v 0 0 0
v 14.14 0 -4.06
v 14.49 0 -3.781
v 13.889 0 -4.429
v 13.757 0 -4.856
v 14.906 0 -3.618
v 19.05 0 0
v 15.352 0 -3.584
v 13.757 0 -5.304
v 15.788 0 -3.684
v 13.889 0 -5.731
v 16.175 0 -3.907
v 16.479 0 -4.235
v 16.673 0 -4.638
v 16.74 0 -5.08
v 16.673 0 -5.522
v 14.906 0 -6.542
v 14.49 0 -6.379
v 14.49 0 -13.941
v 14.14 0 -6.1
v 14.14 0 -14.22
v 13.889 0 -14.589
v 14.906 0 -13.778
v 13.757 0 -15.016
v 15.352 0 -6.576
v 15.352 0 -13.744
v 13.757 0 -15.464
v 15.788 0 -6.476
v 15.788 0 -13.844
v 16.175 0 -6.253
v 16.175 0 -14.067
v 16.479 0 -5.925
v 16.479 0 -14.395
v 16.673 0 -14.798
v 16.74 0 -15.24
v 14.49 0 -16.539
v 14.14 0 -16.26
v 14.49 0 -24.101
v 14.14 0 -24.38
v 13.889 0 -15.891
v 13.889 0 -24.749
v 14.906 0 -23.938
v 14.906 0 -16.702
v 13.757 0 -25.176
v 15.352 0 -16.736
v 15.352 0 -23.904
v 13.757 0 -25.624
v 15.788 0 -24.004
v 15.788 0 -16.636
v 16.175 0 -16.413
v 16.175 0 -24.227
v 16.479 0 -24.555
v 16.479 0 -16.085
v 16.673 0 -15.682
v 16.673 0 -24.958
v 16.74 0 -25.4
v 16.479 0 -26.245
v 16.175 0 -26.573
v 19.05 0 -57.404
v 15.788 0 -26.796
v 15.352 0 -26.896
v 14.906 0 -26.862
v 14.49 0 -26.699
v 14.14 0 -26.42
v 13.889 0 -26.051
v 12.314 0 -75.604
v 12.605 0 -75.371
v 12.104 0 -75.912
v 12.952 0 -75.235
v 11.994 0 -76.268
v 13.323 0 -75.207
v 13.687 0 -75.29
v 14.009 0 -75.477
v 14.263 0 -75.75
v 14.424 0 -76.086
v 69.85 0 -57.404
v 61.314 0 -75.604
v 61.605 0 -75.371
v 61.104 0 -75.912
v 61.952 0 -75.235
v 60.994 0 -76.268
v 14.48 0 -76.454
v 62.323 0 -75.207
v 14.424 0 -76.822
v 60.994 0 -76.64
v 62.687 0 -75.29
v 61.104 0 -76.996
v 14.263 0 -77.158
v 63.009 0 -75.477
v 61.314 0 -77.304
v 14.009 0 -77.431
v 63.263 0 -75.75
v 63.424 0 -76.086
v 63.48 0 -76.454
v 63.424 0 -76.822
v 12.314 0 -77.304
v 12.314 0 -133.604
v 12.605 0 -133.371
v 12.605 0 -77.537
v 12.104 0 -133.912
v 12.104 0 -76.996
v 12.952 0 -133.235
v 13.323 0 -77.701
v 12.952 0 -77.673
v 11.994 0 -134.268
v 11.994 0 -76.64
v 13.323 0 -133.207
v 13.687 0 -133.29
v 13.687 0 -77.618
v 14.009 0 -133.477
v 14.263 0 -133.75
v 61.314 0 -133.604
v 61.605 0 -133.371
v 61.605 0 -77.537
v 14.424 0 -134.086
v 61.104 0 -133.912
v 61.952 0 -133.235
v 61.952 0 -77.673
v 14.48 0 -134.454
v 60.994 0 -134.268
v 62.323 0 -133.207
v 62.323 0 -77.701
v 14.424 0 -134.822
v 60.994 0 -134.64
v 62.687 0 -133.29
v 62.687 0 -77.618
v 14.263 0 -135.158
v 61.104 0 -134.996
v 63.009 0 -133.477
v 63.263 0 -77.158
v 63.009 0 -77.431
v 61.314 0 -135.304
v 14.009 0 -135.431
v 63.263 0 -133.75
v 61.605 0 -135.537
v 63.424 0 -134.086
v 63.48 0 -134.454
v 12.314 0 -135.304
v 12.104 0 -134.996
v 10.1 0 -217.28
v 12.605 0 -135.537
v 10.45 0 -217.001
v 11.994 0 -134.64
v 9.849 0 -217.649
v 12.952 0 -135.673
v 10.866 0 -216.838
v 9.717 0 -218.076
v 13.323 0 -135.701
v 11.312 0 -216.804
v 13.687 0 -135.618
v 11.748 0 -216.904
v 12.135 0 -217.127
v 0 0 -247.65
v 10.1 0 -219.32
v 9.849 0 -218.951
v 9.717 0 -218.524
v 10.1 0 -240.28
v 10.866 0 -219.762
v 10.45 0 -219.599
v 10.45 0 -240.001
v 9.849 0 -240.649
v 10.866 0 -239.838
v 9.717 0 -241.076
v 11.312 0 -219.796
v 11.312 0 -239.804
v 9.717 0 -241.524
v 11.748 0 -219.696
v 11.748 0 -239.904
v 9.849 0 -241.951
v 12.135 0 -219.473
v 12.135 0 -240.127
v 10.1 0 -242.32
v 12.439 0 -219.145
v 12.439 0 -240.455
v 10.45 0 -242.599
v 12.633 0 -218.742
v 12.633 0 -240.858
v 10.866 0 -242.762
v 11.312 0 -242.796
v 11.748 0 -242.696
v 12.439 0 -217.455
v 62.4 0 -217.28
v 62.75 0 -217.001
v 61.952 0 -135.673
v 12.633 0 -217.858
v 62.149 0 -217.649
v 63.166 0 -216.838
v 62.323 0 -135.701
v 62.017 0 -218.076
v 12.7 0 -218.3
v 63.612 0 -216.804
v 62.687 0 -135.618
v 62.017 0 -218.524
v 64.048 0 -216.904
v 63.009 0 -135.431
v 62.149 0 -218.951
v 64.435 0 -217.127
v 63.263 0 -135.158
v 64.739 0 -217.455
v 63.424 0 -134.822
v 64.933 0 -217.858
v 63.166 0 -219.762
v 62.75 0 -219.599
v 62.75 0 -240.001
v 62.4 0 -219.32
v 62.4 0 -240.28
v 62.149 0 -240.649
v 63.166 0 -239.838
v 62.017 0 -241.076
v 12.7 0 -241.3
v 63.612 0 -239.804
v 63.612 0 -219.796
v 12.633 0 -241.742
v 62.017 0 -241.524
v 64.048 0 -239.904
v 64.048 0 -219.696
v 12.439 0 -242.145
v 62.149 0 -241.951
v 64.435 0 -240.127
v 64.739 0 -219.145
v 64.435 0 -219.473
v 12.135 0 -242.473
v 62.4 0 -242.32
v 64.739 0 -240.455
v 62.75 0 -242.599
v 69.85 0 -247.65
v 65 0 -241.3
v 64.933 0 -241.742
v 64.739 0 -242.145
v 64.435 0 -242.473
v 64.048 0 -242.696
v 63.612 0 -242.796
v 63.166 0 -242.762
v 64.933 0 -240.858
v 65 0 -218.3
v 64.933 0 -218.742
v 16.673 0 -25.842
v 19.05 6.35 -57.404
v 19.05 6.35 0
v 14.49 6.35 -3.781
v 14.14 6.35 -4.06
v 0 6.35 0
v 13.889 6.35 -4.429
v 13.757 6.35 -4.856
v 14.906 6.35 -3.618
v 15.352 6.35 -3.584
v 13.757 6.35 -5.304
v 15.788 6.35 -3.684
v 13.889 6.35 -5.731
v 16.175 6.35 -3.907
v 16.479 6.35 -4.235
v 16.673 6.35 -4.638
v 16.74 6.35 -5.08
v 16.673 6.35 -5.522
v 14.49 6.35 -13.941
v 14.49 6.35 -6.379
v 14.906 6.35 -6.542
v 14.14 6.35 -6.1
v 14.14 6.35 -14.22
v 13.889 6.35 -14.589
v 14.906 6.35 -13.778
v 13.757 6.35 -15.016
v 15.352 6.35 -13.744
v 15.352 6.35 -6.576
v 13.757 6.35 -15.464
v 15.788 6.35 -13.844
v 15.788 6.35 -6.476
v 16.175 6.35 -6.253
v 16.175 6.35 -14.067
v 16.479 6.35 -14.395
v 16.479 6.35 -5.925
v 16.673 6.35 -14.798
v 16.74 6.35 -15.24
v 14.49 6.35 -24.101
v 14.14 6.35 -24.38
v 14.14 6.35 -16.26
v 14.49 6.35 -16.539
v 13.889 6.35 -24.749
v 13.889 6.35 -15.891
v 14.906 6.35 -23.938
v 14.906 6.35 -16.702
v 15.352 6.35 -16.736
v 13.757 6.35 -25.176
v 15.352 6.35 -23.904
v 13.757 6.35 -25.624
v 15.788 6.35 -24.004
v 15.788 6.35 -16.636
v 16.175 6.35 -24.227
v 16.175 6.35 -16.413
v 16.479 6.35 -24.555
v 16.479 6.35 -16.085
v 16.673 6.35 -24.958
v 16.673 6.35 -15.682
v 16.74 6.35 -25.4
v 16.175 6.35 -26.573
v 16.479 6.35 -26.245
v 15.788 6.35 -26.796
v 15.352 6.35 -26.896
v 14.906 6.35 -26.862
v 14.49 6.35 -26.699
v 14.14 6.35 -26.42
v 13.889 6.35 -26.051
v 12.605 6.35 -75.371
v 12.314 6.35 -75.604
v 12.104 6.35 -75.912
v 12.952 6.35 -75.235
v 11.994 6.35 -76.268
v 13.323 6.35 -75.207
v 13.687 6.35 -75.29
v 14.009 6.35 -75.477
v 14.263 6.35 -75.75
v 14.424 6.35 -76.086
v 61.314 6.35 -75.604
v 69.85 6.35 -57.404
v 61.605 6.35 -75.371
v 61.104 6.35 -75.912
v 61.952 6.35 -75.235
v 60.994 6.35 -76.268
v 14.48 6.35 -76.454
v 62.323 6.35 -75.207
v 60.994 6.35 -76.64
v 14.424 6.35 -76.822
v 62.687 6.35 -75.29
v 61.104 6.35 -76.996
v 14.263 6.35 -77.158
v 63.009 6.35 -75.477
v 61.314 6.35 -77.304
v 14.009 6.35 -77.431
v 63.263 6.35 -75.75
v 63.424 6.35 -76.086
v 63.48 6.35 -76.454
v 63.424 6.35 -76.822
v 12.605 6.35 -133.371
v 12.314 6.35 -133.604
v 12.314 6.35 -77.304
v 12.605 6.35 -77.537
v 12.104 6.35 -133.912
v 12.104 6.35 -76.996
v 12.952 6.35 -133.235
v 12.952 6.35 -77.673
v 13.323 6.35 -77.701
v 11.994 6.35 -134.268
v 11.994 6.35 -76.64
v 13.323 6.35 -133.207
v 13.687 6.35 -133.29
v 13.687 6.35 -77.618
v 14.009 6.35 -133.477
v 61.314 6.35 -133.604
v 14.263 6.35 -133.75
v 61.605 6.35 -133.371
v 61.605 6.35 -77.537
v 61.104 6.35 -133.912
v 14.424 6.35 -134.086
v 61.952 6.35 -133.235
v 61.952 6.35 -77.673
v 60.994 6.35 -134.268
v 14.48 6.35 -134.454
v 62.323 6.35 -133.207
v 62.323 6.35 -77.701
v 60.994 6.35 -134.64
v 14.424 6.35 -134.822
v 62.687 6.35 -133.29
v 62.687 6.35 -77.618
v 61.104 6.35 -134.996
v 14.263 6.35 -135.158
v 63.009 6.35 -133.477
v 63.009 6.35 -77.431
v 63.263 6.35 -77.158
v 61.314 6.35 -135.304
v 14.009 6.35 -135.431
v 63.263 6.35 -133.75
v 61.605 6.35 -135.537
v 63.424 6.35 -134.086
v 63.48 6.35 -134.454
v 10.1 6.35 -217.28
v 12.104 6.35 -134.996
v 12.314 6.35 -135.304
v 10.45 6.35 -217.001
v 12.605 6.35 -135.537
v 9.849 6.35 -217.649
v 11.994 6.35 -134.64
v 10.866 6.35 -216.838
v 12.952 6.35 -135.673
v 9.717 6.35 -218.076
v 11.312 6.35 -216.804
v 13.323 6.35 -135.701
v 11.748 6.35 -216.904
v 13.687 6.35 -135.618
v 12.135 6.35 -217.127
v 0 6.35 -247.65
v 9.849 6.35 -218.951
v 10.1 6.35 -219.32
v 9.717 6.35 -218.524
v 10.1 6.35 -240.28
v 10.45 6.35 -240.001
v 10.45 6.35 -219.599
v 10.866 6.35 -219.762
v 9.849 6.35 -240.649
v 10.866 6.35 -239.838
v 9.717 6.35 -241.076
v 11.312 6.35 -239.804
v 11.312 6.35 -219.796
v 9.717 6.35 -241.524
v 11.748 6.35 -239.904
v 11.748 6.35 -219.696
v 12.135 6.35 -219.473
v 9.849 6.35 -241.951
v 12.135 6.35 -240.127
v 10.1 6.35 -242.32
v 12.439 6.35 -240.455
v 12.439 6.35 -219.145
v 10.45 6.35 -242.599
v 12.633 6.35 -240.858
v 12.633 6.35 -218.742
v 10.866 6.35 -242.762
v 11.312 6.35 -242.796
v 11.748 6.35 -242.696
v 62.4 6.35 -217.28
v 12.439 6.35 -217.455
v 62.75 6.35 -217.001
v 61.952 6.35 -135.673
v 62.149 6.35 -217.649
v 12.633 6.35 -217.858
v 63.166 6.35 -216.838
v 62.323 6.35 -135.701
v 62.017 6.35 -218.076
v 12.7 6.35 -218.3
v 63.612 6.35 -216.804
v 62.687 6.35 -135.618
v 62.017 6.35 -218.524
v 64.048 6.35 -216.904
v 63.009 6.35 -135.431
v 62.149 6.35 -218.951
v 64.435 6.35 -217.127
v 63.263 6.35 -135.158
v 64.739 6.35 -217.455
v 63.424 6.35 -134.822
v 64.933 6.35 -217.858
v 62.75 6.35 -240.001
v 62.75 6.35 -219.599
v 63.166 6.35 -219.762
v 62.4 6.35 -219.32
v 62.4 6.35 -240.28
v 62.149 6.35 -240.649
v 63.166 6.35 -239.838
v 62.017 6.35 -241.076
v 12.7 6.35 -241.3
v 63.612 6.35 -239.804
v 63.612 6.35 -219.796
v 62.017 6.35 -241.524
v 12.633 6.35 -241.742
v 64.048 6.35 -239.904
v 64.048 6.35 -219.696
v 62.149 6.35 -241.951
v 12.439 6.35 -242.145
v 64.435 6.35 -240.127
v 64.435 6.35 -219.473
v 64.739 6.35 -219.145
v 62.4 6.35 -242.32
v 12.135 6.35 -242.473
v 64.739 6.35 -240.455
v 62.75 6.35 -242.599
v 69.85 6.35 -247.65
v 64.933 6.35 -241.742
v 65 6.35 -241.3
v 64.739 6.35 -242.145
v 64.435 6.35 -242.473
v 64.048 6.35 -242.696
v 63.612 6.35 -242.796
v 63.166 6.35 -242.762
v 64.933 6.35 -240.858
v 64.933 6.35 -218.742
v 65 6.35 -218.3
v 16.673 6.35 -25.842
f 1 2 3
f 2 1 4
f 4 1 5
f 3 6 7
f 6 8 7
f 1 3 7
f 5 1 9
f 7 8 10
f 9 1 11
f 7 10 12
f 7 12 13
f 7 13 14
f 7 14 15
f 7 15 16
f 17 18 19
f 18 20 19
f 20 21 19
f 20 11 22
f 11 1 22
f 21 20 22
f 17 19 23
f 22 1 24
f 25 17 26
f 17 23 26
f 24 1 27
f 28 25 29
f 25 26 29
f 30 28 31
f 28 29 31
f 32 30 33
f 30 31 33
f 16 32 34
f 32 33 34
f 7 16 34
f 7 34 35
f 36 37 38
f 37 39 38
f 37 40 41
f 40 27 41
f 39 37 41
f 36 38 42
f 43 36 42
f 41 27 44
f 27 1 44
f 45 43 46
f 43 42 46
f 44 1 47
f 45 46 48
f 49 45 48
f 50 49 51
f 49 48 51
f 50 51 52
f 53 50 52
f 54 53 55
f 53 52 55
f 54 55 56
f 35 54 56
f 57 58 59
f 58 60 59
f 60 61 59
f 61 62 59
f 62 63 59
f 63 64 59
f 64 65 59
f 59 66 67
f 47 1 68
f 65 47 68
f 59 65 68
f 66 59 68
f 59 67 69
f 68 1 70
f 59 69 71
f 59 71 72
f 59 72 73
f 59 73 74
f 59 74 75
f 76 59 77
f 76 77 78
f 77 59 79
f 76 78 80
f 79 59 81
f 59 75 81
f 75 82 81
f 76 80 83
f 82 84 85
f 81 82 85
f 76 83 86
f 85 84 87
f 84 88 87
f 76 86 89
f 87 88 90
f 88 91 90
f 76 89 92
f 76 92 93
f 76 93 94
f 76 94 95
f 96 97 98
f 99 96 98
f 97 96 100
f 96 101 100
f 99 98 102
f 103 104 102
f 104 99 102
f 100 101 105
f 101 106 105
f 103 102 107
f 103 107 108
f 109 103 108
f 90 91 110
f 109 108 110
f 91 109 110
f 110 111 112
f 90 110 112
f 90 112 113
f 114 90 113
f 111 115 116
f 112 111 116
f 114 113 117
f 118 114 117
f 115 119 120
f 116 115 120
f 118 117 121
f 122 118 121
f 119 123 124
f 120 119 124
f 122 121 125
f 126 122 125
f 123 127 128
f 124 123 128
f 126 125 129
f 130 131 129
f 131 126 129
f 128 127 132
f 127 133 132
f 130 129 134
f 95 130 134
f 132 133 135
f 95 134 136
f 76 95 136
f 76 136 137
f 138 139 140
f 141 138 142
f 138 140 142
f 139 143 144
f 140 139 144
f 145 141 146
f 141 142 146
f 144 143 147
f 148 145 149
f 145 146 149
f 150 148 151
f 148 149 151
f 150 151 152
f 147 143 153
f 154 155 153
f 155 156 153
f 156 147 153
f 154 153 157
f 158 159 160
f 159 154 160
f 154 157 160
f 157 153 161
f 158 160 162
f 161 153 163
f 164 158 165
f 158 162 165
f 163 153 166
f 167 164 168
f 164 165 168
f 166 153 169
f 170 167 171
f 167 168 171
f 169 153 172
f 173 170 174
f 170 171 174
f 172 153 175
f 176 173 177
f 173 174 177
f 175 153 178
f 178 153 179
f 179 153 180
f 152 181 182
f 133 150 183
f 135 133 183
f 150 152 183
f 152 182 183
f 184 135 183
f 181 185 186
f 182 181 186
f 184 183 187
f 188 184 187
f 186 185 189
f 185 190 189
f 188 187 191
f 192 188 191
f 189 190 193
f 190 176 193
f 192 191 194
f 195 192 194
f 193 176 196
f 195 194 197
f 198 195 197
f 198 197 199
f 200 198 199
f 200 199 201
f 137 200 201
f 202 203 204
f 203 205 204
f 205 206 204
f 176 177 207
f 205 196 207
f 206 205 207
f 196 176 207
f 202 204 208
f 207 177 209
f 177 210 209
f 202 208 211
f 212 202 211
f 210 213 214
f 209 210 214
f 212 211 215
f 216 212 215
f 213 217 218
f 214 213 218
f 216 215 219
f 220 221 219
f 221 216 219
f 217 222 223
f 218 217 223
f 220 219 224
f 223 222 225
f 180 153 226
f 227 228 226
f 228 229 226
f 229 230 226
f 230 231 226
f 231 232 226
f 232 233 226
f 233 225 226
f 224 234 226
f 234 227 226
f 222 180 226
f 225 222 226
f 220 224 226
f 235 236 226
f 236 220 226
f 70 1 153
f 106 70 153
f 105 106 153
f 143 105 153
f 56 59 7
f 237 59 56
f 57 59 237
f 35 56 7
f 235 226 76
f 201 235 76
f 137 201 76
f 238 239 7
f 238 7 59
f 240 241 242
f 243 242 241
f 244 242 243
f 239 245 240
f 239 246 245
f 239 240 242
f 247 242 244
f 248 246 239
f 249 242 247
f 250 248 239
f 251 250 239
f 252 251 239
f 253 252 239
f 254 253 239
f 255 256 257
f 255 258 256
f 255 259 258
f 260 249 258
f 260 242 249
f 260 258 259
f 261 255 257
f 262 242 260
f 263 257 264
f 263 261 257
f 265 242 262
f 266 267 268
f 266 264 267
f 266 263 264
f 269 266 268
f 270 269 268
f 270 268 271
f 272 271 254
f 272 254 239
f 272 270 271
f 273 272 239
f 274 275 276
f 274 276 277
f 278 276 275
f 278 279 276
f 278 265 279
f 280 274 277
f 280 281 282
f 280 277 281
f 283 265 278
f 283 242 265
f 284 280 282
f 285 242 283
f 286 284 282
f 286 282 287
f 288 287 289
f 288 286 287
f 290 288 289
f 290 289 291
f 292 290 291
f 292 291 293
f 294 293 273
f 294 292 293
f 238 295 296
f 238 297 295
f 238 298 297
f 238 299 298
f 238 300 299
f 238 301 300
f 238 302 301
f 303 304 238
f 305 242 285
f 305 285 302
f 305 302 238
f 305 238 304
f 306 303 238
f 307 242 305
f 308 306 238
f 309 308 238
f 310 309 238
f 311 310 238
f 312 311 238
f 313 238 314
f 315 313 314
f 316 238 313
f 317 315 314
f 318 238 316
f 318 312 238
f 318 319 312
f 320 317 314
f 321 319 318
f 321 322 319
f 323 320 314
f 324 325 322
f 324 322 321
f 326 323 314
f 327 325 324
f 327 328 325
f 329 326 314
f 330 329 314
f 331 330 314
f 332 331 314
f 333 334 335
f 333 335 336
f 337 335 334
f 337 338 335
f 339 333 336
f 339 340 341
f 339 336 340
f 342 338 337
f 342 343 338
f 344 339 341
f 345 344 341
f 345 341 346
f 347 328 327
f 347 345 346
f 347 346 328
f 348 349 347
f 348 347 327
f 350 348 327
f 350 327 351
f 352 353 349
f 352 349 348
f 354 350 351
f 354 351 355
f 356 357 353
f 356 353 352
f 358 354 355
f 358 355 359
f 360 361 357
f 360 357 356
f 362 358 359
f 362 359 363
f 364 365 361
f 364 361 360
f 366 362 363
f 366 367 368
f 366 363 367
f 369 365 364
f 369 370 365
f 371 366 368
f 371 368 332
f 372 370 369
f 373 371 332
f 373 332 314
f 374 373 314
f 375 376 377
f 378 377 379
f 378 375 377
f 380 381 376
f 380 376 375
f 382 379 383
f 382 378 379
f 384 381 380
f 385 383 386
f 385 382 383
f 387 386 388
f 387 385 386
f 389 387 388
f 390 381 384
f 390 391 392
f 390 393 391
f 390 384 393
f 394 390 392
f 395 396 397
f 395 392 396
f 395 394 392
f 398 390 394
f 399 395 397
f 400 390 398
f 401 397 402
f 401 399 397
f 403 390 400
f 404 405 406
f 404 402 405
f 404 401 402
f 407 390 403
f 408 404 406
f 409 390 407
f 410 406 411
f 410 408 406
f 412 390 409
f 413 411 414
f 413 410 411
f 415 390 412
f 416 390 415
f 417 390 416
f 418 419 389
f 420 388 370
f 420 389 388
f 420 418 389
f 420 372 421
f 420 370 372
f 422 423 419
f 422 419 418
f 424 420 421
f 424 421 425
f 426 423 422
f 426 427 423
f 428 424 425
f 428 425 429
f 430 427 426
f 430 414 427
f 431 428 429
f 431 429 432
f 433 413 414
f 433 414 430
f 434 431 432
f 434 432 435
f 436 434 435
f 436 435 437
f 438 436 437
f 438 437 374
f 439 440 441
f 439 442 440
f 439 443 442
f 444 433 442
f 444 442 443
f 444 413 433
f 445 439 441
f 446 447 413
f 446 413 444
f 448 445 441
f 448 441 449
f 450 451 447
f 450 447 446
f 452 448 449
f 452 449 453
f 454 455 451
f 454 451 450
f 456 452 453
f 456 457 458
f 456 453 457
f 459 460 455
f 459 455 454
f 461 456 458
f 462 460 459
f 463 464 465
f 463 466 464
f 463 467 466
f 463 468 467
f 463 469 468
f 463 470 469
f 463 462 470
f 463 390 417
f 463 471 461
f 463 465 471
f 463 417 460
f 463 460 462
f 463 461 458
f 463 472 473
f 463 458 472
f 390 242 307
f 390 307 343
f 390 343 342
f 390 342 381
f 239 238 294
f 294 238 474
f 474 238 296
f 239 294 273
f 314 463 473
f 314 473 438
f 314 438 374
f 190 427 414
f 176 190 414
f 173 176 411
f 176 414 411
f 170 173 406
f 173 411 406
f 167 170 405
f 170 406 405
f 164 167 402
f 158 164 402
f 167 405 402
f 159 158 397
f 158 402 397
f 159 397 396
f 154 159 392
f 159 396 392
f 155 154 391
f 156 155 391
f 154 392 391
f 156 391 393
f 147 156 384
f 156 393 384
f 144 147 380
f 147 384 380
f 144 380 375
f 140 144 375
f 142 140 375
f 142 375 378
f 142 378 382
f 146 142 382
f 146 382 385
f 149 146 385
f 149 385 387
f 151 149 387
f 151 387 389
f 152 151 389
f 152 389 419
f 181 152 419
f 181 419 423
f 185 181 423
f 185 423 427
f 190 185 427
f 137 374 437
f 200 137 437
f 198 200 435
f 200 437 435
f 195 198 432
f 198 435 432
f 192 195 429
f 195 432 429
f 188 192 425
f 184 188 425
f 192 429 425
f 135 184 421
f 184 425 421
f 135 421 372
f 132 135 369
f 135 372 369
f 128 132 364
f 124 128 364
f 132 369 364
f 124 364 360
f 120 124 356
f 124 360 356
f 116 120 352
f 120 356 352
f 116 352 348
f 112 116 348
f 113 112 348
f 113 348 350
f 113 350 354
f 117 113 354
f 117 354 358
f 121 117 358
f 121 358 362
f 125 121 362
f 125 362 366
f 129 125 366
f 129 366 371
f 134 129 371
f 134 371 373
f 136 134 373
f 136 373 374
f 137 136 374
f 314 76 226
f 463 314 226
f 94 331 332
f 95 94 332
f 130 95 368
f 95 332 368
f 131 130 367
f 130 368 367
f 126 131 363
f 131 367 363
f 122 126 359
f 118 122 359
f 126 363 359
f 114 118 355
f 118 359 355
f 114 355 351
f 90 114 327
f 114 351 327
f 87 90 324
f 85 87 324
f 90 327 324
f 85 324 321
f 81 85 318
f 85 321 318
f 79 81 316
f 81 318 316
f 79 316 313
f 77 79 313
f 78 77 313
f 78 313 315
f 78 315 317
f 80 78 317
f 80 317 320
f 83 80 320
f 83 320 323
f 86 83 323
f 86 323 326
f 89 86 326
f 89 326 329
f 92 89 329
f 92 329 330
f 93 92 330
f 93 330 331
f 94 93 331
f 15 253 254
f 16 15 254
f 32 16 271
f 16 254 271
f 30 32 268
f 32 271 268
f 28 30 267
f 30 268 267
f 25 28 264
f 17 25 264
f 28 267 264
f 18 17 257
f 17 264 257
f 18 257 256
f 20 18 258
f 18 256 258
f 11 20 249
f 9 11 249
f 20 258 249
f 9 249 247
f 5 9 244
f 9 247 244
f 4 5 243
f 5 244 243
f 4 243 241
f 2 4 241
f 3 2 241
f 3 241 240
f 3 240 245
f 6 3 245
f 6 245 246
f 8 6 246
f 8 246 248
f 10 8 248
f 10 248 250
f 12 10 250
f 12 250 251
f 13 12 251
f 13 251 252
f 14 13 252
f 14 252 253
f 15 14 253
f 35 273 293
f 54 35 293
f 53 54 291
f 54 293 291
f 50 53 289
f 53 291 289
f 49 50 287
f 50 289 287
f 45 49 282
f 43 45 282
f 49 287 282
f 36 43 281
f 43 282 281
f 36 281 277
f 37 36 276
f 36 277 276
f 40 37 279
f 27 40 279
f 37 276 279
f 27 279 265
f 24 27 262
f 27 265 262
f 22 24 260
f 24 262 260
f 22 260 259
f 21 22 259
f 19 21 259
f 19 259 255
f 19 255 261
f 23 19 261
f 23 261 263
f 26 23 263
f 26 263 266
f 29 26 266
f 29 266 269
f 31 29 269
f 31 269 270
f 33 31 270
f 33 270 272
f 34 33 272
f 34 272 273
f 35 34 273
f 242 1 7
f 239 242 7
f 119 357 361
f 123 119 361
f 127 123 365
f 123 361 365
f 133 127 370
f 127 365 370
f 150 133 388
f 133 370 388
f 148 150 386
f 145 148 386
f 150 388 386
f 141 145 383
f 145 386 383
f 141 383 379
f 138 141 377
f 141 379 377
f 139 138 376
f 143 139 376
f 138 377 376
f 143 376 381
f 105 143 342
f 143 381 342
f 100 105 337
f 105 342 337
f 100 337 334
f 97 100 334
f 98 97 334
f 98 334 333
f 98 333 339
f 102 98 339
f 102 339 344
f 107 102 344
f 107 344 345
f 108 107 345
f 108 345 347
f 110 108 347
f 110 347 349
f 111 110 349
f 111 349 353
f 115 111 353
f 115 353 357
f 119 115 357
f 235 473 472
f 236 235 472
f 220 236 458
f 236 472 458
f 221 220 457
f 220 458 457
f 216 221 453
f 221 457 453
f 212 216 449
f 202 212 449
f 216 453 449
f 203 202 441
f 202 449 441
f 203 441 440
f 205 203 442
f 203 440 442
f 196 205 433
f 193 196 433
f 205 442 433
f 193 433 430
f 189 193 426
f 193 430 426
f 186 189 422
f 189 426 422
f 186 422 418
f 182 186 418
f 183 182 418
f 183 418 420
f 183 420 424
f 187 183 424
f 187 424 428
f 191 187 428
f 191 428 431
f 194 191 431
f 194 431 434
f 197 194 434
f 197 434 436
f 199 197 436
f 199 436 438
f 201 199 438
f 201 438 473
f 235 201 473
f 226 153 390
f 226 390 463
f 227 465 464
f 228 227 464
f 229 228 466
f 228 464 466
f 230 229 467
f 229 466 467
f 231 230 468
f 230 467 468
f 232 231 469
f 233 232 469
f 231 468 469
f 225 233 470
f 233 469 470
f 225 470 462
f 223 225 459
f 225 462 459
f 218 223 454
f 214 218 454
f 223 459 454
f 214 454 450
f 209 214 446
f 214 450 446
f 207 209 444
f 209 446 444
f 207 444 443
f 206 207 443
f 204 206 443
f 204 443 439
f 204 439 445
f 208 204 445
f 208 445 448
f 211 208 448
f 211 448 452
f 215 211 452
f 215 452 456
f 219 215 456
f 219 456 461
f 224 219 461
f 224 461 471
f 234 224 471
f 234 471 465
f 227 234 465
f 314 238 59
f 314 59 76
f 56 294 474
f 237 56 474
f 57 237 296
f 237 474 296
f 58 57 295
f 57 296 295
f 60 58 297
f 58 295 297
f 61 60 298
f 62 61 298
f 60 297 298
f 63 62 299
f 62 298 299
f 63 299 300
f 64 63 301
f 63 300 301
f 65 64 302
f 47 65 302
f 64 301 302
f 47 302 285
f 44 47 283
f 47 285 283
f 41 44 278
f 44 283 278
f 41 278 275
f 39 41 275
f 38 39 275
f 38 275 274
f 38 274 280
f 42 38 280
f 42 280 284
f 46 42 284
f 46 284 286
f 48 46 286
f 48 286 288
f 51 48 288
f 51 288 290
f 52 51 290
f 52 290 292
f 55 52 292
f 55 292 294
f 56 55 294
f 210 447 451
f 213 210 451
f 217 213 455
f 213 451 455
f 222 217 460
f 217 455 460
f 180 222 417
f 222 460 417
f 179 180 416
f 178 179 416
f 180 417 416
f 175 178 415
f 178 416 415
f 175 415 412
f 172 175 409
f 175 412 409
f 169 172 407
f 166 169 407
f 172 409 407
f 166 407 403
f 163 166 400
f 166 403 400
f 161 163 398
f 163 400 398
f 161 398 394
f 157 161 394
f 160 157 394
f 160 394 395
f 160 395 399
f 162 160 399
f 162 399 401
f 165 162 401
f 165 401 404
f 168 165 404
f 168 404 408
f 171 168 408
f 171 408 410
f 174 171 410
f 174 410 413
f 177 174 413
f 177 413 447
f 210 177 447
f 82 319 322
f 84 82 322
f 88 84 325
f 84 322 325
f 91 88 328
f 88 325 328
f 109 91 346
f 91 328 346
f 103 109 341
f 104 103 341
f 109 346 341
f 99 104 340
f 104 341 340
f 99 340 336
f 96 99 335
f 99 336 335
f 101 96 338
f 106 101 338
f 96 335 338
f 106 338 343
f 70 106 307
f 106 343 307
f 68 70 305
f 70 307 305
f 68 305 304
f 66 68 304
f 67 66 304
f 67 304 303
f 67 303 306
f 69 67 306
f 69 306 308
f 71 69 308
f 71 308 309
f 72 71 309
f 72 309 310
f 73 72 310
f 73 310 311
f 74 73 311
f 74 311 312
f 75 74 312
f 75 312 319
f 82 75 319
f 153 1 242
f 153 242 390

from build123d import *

# Parameters (mm, degrees)
SKETCH1_W           = 69.85
SKETCH1_H           = 247.65
BOSS_EXTRUDE1_DEPTH = 6.35
SKETCH2_W           = 50.8
SKETCH2_H           = 57.404
CUT_EXTRUDE1_DEPTH  = 7.35
SKETCH3_R           = 1.499997
CUT_EXTRUDE2_DEPTH  = 7.35
SKETCH4_R           = 1.499997
CUT_EXTRUDE3_DEPTH  = 7.35
SKETCH5_R           = 1.25
CUT_EXTRUDE4_DEPTH  = 7.35


with BuildPart() as part:
    # Sketch1 → Boss-Extrude1 (new body)
    with BuildSketch(Plane(origin=(0, 0, 0), x_dir=(1, 0, 0), z_dir=(0, 1, 0))):
        with Locations((34.925, 123.825)):
            Rectangle(SKETCH1_W, SKETCH1_H)
    extrude(amount=BOSS_EXTRUDE1_DEPTH)

    # Sketch2 → Cut-Extrude1 (cut, through all)
    with BuildSketch(Plane(origin=(0, 6.35, 0), x_dir=(1, 0, 0), z_dir=(0, 1, 0))):
        with Locations((44.45, 28.702)):
            Rectangle(SKETCH2_W, SKETCH2_H)
    extrude(amount=-CUT_EXTRUDE1_DEPTH, mode=Mode.SUBTRACT)

    # Sketch3 → Cut-Extrude2 (cut, through all)
    with BuildSketch(Plane(origin=(0, 6.35, 0), x_dir=(1, 0, 0), z_dir=(0, 1, 0))):
        with Locations((15.24, 5.08)):
            Circle(SKETCH3_R)
        with Locations((15.24, 25.4)):
            Circle(SKETCH3_R)
        with Locations((15.24, 15.24)):
            Circle(SKETCH3_R)
    extrude(amount=-CUT_EXTRUDE2_DEPTH, mode=Mode.SUBTRACT)

    # Sketch4 → Cut-Extrude3 (cut, through all)
    with BuildSketch(Plane(origin=(0, 6.35, 0), x_dir=(1, 0, 0), z_dir=(0, 1, 0))):
        with Locations((63.5, 241.3)):
            Circle(SKETCH4_R)
        with Locations((63.5, 218.3)):
            Circle(SKETCH4_R)
        with Locations((11.2, 218.3)):
            Circle(SKETCH4_R)
        with Locations((11.2, 241.3)):
            Circle(SKETCH4_R)
    extrude(amount=-CUT_EXTRUDE3_DEPTH, mode=Mode.SUBTRACT)

    # Sketch5 → Cut-Extrude4 (cut, through all)
    with BuildSketch(Plane(origin=(0, 6.35, 0), x_dir=(1, 0, 0), z_dir=(0, 1, 0))):
        with Locations((13.23, 134.454)):
            Circle(SKETCH5_R)
        with Locations((62.23, 134.454)):
            Circle(SKETCH5_R)
        with Locations((62.23, 76.454)):
            Circle(SKETCH5_R)
        with Locations((13.23, 76.454)):
            Circle(SKETCH5_R)
    extrude(amount=-CUT_EXTRUDE4_DEPTH, mode=Mode.SUBTRACT)


solid = part.part
